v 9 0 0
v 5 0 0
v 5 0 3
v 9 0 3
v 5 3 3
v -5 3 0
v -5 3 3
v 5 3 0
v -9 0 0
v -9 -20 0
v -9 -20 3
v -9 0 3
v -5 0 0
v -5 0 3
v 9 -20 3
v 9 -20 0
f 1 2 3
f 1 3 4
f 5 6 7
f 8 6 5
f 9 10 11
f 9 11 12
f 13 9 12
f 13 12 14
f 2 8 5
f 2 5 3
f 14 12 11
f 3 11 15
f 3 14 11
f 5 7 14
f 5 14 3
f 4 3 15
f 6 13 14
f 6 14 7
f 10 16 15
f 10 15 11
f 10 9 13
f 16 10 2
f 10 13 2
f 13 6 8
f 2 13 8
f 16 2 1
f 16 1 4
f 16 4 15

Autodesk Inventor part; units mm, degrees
ref_plane "YZ Plane" through (0, 0, 0) normal (1, 0, 0) x (0, 1, 0)
ref_plane "XZ Plane" through (0, 0, 0) normal (0, 1, 0) x (-1, 0, 0)
ref_plane "XY Plane" through (0, 0, 0) normal (0, 0, 1) x (1, 0, 0)
sketch "Sketch1" plane through (0, 0, 0) normal (0, 0, 1) x (1, 0, 0)
  line L0 (9, 0) -> (9, -20)
  line L1 (9, -20) -> (-9, -20)
  line L2 (-9, -20) -> (-9, 0)
  line L3 (-5, 0) -> (-5, 3)
  line L4 (-5, 3) -> (5, 3)
  line L5 (5, 3) -> (5, 0)
  line L6 (-9, 0) -> (-5, 0)
  line L7 (5, 0) -> (9, 0)
  line L8 (0, 0) -> (0, 3) construction
  line L9 (0, 0) -> (-9, 0) construction
  dimension "d0" = 18
  dimension "d1" = 4
  dimension "d2" = 3
  dimension "d3" = 20
extrude "Extrusion1" add sketch "Sketch1" along normal blind 3
properties part number "electromagnet_mnt_p2"
